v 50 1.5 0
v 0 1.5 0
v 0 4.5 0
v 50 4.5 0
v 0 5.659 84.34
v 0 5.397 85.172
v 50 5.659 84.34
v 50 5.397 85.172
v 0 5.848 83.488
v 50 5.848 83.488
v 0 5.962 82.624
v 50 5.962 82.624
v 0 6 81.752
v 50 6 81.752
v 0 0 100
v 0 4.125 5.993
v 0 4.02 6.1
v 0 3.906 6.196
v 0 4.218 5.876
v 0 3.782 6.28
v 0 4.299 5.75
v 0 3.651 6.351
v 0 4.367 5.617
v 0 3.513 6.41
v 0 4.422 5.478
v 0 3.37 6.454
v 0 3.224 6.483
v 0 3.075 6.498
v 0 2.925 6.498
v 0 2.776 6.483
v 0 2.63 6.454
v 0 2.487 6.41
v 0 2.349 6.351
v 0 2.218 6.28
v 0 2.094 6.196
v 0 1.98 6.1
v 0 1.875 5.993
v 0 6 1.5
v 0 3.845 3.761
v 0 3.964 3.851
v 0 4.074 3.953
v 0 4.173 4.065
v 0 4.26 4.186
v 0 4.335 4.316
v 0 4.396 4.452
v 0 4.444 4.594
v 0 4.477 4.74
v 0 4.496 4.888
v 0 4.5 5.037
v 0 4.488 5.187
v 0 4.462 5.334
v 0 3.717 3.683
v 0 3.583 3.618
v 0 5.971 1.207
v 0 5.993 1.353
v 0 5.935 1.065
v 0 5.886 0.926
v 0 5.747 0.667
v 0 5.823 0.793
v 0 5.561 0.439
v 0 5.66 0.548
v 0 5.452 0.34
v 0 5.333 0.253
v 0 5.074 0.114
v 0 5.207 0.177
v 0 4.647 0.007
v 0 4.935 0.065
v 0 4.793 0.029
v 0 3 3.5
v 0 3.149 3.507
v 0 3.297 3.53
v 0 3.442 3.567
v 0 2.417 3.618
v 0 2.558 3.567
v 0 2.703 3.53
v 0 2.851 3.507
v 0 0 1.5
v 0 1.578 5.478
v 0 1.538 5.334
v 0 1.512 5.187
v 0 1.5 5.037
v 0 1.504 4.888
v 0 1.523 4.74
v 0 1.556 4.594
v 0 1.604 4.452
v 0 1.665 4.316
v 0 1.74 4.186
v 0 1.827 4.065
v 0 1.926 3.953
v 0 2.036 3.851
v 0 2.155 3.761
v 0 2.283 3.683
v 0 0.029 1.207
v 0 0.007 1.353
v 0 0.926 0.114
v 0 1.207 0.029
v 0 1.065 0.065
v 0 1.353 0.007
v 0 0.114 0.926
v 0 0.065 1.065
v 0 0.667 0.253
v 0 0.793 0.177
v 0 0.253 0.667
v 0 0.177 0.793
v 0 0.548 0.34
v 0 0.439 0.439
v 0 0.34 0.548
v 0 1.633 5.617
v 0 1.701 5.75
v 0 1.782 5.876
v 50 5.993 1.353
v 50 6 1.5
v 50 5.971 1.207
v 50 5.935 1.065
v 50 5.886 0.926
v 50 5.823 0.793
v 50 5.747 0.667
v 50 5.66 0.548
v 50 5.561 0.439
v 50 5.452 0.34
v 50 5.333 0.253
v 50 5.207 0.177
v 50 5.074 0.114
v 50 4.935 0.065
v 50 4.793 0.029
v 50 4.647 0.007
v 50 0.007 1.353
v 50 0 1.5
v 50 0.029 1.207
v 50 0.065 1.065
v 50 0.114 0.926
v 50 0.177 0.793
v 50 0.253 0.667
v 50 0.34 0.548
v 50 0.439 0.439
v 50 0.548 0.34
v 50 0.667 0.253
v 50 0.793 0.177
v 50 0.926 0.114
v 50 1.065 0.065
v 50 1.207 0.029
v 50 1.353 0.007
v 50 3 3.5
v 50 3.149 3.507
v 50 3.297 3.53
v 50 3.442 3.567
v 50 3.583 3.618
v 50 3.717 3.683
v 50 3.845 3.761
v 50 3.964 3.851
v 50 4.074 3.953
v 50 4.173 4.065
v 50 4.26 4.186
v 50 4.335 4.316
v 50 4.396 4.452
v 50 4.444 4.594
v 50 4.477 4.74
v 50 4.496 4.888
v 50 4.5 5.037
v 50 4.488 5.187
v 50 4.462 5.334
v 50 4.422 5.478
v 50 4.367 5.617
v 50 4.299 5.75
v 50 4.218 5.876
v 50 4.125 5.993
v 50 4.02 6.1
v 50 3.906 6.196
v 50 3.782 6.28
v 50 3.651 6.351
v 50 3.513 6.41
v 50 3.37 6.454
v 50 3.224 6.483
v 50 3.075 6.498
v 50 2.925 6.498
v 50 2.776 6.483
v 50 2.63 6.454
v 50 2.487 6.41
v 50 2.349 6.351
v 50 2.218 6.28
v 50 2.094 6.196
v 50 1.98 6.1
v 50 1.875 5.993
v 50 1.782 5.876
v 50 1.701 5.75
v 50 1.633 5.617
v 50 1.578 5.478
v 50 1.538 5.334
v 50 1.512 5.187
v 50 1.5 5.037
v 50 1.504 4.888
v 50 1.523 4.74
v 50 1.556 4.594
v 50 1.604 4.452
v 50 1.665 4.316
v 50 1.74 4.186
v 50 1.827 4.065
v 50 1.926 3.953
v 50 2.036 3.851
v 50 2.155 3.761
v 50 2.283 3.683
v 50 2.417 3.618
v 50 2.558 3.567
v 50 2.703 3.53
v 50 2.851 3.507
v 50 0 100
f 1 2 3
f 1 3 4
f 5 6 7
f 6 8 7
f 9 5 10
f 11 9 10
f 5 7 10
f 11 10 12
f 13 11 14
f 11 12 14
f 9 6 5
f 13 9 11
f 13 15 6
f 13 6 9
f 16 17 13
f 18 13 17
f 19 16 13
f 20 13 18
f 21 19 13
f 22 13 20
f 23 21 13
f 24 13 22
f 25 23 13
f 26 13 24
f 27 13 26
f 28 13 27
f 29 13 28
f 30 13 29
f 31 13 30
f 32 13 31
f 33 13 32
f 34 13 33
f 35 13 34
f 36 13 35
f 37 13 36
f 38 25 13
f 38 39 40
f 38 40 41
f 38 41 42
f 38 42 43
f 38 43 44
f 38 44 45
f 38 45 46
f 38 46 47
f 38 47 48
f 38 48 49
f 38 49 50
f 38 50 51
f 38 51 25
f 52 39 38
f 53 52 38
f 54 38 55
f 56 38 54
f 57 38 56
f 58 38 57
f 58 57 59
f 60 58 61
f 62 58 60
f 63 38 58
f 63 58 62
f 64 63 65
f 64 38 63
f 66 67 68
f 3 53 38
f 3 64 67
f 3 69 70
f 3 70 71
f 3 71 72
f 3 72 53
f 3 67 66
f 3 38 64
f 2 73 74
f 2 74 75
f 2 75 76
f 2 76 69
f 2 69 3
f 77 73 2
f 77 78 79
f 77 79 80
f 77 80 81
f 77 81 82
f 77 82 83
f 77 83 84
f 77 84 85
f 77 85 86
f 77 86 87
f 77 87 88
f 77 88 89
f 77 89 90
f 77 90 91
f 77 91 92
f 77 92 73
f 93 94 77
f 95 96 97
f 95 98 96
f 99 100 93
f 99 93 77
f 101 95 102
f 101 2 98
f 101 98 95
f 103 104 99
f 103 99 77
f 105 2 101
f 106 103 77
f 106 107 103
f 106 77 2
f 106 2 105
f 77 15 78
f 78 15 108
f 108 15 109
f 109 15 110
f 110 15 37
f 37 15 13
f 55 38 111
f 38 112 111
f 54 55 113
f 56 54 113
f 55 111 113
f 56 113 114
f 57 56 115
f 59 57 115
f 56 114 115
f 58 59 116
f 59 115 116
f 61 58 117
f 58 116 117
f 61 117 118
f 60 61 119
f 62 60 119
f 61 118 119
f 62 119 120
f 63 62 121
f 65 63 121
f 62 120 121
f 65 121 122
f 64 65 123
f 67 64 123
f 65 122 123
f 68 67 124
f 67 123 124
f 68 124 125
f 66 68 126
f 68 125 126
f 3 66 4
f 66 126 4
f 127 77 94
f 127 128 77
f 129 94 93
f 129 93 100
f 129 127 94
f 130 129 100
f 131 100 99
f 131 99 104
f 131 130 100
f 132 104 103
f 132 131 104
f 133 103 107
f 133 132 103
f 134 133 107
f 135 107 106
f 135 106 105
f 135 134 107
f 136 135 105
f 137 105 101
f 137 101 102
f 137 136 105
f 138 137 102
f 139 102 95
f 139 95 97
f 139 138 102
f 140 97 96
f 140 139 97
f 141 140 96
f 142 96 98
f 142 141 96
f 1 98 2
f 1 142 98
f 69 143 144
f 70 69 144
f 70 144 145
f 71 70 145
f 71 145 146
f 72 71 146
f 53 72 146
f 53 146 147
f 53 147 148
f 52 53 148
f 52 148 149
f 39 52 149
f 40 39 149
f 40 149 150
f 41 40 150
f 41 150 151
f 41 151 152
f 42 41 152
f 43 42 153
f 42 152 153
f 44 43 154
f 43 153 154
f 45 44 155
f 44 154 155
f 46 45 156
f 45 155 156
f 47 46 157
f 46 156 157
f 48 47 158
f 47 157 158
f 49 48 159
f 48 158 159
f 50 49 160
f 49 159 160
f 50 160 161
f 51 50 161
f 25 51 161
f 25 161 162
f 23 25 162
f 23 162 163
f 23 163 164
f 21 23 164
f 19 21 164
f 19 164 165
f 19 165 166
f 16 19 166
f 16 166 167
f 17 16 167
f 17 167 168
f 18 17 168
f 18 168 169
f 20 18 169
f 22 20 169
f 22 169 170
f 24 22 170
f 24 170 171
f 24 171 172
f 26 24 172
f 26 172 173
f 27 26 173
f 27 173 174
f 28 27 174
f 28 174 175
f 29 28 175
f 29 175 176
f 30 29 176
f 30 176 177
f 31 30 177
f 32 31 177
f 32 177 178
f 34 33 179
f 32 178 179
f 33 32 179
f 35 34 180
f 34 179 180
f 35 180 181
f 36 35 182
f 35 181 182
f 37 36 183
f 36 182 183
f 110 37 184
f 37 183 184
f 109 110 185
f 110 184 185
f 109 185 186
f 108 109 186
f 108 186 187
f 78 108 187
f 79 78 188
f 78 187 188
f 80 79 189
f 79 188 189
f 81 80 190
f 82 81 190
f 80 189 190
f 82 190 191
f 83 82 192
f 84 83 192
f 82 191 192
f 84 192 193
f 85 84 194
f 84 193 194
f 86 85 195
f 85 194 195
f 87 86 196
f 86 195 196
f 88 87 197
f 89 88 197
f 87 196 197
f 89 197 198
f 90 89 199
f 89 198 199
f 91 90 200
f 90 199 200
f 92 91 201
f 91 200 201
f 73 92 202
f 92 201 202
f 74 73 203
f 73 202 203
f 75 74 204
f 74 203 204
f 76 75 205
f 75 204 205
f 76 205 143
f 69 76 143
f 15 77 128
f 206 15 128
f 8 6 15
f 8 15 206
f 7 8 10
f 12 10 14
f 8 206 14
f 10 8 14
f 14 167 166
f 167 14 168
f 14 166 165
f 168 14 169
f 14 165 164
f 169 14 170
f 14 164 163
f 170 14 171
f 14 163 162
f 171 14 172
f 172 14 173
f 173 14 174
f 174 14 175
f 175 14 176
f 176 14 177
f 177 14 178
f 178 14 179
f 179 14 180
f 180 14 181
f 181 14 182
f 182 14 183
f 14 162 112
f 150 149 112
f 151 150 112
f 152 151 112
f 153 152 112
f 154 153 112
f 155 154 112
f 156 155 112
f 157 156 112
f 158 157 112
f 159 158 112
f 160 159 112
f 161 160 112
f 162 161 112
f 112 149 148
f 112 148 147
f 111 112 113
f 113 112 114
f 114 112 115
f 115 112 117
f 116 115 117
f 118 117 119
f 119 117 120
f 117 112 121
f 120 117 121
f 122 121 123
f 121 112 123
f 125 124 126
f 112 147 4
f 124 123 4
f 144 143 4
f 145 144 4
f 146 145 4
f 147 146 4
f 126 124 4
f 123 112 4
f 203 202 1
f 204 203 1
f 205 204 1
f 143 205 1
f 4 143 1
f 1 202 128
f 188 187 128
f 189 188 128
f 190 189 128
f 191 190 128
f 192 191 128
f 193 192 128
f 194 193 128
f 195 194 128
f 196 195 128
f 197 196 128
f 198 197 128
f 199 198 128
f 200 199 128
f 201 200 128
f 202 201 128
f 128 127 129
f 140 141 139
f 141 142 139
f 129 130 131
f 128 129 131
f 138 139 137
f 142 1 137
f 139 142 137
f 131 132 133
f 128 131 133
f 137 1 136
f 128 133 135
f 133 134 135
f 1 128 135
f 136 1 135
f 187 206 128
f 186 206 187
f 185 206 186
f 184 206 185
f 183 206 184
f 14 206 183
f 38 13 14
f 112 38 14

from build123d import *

# Parameters (mm, degrees)
SKETCH1_W           = 50
SKETCH1_H           = 100
BOSS_EXTRUDE1_DEPTH = 6
SKETCH2_R           = 1.5
CUT_EXTRUDE1_DEPTH  = 112.964280018
FILLET2_R           = 1.5
CHAMFER1_SIZE2      = 16.484864517
CHAMFER1_SIZE       = 6
FILLET3_R           = 10


with BuildPart() as part:
    # Sketch1 → Boss-Extrude1 (new body)
    with BuildSketch(Plane(origin=(0, 0, 0), x_dir=(1, 0, 0), z_dir=(0, 1, 0))):
        with Locations((25, -50)):
            Rectangle(SKETCH1_W, SKETCH1_H)
    extrude(amount=BOSS_EXTRUDE1_DEPTH)

    # Sketch2 → Cut-Extrude1 (cut, through all)
    with BuildSketch(Plane(origin=(50, 0, 0), x_dir=(0, 0, -1), z_dir=(1, 0, 0))):
        with Locations((-5, 3)):
            Circle(SKETCH2_R)
    extrude(amount=-CUT_EXTRUDE1_DEPTH, mode=Mode.SUBTRACT)

    # Fillet2
    fillet2_edges = [part.edges().sort_by_distance(p)[0] for p in [
        (25, 6, 0),
        (25, 0, 0),
    ]]
    fillet(fillet2_edges, radius=FILLET2_R)

    # Chamfer1
    chamfer1_edges = [part.edges().sort_by_distance(p)[0] for p in [
        (25, 6, 100),
    ]]
    chamfer1_side = [part.faces().sort_by_distance(p)[0] for p in [
        (25, 5.88, 100),
    ]]
    chamfer(chamfer1_edges, length=CHAMFER1_SIZE - 0.0001, length2=CHAMFER1_SIZE2 - 0.0001, reference=chamfer1_side[0])  # a hair under: the kernel refuses the full size

    # Fillet3
    fillet3_edges = [part.edges().sort_by_distance(p)[0] for p in [
        (25, 6, 83.515235483),
    ]]
    fillet(fillet3_edges, radius=FILLET3_R)


solid = part.part
